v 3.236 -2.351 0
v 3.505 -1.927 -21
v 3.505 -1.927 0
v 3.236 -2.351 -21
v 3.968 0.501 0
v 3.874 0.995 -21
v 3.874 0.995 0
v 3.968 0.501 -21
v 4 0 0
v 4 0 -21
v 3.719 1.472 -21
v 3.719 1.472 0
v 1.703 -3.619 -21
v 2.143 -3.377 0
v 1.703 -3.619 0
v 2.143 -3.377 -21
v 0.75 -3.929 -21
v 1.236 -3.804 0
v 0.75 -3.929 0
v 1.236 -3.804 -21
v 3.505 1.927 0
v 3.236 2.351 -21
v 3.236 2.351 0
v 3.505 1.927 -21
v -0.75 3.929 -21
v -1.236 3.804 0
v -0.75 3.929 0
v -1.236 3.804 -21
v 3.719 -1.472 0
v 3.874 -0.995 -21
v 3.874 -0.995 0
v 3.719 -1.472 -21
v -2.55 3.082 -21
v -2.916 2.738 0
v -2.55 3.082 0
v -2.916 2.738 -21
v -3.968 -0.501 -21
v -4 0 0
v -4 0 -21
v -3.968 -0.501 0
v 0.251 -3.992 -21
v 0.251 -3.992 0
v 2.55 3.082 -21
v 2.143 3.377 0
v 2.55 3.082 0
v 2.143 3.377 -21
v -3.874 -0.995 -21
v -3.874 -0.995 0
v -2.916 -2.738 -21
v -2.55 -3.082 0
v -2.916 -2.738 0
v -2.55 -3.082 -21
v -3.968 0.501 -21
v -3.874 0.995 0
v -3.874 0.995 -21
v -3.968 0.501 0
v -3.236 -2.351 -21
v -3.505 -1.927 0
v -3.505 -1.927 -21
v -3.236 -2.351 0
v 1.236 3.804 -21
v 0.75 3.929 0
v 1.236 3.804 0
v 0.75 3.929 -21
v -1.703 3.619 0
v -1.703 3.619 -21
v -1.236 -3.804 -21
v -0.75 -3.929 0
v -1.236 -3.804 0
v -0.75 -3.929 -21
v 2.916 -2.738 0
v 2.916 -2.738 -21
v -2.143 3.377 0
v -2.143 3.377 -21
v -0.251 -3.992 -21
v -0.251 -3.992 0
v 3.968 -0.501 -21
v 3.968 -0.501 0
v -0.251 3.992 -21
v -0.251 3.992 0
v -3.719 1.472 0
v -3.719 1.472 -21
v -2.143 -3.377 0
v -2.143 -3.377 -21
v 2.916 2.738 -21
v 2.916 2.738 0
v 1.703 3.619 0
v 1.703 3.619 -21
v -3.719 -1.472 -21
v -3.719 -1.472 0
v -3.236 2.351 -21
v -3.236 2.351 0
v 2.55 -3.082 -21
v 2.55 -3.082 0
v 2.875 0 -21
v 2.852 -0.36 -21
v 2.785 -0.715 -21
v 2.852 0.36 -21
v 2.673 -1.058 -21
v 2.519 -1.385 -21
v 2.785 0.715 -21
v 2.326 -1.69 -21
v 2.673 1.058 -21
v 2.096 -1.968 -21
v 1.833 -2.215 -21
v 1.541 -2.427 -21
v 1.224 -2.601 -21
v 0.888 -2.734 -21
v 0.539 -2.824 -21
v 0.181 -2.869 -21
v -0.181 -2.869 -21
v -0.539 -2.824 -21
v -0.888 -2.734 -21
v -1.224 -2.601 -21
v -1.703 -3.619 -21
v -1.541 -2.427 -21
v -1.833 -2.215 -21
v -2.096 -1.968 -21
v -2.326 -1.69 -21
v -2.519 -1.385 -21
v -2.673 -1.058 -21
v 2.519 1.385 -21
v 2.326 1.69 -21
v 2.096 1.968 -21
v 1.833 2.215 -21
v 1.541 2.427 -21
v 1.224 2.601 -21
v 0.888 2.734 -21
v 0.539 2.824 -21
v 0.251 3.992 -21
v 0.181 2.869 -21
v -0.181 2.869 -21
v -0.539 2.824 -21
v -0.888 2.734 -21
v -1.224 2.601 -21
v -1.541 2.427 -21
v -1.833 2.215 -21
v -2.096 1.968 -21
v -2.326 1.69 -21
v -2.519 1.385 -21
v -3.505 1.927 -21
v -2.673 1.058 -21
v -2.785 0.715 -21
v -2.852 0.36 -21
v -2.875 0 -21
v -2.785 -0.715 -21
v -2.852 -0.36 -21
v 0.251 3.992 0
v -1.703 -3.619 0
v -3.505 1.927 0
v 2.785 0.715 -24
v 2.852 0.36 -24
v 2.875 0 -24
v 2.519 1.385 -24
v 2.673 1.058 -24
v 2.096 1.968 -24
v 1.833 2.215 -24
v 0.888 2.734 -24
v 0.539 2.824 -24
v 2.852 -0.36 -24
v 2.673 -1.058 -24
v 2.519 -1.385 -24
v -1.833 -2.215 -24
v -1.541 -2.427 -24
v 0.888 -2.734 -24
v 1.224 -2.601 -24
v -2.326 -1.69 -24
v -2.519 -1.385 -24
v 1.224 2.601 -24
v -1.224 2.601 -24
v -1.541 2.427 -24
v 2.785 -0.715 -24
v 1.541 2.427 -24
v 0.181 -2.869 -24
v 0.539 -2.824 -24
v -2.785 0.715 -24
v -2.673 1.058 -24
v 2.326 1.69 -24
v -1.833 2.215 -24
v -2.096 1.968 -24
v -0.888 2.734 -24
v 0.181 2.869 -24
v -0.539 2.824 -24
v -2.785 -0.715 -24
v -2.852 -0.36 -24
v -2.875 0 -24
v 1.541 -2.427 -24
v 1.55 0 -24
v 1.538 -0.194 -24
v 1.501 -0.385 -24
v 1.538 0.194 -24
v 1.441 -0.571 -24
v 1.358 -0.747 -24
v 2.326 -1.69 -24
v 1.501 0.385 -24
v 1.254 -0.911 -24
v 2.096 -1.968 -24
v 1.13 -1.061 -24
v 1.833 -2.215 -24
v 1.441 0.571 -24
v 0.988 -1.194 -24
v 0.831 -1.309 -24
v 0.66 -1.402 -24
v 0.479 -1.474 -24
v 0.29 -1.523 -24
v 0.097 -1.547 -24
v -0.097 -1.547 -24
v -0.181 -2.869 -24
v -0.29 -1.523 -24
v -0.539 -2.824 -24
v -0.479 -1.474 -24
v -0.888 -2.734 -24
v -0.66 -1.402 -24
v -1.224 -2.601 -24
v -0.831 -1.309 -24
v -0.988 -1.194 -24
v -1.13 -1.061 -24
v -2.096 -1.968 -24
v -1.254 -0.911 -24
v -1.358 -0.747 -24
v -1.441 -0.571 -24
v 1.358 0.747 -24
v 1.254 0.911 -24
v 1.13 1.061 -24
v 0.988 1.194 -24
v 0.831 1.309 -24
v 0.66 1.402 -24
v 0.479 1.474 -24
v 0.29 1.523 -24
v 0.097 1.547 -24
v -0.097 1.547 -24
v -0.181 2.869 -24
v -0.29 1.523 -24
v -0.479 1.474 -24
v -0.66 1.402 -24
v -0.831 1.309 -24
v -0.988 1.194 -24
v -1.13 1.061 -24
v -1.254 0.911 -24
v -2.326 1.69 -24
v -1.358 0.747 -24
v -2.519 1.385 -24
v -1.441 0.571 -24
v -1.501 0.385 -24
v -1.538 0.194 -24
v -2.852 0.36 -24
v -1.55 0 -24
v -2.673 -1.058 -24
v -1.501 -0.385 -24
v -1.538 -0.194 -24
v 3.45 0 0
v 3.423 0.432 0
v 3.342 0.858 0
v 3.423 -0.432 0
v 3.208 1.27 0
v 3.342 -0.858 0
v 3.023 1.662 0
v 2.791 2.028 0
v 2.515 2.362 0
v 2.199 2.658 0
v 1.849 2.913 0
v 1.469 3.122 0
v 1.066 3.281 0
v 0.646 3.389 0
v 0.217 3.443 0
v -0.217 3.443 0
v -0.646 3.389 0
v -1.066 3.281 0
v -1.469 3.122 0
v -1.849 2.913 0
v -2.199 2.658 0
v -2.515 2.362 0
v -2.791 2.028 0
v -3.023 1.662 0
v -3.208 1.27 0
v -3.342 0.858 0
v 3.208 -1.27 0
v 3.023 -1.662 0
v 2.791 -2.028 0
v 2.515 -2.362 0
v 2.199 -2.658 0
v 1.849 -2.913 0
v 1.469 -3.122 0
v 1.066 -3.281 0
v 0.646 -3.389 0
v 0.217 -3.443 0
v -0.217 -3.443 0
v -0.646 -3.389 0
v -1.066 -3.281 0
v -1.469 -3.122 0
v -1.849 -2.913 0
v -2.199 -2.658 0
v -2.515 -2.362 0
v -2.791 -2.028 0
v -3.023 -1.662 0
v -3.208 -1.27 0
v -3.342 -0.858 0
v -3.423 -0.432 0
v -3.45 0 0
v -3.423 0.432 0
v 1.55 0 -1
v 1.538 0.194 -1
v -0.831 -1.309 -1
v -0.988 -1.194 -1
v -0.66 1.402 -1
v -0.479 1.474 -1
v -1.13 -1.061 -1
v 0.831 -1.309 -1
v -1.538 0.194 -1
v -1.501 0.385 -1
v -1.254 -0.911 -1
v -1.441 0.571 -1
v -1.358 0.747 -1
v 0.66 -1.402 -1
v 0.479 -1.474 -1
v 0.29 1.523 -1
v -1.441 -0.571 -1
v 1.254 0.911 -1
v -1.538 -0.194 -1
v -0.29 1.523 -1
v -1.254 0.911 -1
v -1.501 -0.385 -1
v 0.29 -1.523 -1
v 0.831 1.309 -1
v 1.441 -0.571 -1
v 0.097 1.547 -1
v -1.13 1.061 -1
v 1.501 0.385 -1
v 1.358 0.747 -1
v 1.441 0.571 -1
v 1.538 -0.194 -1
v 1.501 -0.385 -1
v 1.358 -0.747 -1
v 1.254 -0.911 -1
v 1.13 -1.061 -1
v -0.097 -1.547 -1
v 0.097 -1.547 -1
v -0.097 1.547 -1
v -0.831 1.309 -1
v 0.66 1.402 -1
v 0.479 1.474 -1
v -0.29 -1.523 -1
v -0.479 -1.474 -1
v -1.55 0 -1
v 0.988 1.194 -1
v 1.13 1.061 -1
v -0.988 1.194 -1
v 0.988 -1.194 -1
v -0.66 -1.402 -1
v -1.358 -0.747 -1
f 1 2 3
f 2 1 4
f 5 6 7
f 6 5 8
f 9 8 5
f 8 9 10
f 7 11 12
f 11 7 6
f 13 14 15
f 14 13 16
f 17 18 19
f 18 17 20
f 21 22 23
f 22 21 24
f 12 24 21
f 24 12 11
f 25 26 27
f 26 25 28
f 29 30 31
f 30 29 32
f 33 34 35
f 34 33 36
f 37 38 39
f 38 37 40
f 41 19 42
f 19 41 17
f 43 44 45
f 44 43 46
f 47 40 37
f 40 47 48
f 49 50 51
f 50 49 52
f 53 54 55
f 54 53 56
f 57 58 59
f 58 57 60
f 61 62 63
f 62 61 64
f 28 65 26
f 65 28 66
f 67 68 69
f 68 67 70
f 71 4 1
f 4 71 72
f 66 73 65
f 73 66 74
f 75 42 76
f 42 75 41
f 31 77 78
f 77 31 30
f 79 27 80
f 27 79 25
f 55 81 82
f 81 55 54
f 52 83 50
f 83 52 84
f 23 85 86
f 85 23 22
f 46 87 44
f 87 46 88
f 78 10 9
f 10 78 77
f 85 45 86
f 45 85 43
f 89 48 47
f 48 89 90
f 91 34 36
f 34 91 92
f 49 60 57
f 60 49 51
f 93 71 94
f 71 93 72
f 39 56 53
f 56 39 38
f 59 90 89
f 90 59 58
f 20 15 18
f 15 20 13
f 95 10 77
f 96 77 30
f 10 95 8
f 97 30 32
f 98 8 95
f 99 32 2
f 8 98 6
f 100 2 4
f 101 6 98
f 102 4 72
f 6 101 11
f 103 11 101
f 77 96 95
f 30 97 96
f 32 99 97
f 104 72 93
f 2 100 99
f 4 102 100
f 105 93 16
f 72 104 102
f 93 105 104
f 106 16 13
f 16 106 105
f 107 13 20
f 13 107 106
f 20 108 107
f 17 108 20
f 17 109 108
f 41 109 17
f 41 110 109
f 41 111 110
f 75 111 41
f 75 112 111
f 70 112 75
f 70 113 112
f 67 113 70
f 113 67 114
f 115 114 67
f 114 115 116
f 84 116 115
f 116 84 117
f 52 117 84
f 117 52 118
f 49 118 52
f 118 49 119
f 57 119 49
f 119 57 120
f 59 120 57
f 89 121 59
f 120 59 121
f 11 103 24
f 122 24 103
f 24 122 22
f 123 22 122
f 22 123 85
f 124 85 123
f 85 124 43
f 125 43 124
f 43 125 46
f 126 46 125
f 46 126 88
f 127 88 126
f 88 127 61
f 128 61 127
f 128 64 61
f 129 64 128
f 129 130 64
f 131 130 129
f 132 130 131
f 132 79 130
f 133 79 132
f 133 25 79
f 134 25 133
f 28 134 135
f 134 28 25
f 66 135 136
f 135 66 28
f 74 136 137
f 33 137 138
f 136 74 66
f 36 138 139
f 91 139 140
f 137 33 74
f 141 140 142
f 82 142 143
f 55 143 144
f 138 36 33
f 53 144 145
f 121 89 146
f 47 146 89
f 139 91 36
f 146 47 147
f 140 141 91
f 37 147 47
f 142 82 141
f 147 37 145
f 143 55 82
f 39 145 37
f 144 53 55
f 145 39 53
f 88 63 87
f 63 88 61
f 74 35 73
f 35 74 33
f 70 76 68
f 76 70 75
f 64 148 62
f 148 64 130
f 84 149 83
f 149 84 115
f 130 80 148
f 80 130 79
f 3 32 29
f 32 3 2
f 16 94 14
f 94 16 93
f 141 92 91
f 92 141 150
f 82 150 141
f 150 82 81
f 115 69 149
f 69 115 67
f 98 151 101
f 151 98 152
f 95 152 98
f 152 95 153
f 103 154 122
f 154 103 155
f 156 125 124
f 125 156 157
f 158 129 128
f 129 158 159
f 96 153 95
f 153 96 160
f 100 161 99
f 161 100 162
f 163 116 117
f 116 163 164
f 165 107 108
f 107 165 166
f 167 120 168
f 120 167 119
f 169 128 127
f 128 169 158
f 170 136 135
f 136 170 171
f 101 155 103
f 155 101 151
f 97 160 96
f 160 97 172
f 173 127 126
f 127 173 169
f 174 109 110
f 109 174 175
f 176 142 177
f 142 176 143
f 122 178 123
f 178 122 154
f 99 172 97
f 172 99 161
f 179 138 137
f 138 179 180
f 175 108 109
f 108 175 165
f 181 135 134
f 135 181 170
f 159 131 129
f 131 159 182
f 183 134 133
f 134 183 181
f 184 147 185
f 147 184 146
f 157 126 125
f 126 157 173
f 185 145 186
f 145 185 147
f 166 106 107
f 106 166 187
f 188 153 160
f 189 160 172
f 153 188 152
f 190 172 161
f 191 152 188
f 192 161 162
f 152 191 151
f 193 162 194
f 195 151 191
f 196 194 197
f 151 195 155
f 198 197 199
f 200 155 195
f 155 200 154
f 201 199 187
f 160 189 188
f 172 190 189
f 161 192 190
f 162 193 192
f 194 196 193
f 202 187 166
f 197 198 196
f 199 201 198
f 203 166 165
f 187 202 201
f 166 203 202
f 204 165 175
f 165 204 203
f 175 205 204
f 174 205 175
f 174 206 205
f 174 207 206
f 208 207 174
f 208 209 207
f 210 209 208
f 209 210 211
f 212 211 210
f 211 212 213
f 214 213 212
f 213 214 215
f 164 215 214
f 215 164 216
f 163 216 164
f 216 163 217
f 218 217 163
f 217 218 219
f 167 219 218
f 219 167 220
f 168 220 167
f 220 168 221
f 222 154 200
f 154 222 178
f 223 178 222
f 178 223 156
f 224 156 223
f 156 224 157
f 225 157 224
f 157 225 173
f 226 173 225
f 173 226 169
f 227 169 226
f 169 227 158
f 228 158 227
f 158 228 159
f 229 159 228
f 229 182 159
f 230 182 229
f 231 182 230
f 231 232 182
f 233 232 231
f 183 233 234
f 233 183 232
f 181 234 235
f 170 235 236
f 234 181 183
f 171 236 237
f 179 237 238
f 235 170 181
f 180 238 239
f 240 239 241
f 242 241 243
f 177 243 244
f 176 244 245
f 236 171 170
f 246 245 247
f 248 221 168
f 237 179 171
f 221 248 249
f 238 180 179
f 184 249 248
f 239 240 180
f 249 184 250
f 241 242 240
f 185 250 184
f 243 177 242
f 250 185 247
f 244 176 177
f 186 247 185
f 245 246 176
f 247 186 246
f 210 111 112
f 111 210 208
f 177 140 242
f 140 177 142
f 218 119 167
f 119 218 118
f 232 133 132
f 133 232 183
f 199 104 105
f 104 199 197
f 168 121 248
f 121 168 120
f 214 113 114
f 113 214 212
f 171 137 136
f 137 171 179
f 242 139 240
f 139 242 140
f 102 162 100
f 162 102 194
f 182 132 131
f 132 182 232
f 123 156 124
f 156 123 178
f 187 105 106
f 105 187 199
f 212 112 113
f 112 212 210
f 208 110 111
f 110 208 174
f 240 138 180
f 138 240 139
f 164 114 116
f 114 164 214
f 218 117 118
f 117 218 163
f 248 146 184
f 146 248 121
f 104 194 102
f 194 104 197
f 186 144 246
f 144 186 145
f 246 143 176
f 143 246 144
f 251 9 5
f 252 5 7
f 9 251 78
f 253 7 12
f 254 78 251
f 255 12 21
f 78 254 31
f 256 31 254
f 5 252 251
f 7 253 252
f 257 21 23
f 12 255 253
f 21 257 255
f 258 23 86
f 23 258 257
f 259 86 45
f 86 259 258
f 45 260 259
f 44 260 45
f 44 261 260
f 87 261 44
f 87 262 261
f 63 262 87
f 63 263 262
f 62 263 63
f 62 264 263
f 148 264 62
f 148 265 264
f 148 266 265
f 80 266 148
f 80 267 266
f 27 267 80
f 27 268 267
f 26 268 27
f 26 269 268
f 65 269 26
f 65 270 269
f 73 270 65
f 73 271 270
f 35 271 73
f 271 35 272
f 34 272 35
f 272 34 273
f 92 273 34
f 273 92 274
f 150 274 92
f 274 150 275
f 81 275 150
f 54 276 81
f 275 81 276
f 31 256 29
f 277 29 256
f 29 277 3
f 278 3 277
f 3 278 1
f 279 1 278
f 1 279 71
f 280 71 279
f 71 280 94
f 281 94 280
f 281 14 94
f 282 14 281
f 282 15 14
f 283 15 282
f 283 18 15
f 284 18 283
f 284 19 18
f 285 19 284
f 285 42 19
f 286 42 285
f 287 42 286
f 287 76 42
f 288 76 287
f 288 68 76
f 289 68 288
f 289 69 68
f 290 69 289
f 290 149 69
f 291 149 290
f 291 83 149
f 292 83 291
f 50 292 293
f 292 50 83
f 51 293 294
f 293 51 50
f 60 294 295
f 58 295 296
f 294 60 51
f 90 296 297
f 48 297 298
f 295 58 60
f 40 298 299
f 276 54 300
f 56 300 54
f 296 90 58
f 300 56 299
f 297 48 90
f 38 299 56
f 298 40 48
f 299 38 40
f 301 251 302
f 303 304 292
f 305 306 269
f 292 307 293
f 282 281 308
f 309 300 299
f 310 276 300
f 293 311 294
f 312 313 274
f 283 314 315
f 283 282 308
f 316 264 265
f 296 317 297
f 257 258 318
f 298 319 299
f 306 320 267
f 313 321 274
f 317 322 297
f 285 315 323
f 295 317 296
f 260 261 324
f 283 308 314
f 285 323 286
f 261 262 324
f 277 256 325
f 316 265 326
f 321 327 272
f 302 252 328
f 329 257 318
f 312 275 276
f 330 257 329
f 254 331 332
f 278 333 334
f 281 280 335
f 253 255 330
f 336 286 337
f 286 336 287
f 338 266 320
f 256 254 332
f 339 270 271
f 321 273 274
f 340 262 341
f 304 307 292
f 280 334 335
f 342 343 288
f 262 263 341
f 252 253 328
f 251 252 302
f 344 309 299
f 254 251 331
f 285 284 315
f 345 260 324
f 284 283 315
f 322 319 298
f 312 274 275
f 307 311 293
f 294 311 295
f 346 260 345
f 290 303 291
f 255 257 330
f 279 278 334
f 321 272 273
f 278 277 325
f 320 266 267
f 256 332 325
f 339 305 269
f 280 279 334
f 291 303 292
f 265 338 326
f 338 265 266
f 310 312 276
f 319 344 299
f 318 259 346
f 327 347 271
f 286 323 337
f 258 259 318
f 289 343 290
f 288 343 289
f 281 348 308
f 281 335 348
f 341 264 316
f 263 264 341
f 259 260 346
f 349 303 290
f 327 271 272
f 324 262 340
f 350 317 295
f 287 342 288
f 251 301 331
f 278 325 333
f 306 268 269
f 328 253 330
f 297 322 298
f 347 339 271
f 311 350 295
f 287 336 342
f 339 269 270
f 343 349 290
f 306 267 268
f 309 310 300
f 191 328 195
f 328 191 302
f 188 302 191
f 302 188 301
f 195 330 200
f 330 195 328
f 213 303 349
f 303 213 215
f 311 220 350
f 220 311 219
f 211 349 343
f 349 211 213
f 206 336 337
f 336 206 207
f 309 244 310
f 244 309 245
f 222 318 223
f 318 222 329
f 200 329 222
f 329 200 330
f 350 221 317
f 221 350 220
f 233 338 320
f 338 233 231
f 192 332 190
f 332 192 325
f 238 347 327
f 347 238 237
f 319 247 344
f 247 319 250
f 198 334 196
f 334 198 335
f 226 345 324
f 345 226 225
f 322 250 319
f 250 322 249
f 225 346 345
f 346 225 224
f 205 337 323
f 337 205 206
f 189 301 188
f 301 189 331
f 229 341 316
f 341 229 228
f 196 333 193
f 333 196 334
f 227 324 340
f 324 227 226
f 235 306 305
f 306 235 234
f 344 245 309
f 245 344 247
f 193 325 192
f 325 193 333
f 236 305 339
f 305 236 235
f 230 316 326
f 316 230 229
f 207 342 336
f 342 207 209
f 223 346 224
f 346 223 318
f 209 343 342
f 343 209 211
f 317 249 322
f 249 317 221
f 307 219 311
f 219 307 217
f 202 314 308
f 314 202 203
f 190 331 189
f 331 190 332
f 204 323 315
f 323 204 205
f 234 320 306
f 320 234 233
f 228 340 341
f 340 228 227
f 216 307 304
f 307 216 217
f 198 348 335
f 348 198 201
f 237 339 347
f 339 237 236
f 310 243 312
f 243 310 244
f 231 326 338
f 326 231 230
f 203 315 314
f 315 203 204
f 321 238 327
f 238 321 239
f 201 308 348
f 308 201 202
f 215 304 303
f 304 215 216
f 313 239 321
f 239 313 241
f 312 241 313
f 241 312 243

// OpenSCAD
$fn = 50;

difference() {
	union() {
		translate(v = [0, 0, -21.0]) {
			cylinder(h = 24, r = 4.0);
		}
		#translate(v = [0, 0, -24.0]) {
			cylinder(h = 24, r = 2.875);
		}
	}
	union() {
		translate(v = [0, 0, 0]) {
			rotate(a = [0, 0, 0]) {
				difference() {
					union() {
						translate(v = [0, 0, -24.0]) {
							cylinder(h = 24, r = 1.25);
						}
						translate(v = [0, 0, -1.0]) {
							cylinder(h = 1.0, r1 = 1.55, r2 = 3.45);
						}
						translate(v = [0, 0, -24.0]) {
							cylinder(h = 24, r = 1.55);
						}
						translate(v = [0, 0, -24.0]) {
							cylinder(h = 24, r = 1.25);
						}
					}
					union();
				}
			}
		}
		#cylinder(h = 3, r = 5.0);
	}
}
